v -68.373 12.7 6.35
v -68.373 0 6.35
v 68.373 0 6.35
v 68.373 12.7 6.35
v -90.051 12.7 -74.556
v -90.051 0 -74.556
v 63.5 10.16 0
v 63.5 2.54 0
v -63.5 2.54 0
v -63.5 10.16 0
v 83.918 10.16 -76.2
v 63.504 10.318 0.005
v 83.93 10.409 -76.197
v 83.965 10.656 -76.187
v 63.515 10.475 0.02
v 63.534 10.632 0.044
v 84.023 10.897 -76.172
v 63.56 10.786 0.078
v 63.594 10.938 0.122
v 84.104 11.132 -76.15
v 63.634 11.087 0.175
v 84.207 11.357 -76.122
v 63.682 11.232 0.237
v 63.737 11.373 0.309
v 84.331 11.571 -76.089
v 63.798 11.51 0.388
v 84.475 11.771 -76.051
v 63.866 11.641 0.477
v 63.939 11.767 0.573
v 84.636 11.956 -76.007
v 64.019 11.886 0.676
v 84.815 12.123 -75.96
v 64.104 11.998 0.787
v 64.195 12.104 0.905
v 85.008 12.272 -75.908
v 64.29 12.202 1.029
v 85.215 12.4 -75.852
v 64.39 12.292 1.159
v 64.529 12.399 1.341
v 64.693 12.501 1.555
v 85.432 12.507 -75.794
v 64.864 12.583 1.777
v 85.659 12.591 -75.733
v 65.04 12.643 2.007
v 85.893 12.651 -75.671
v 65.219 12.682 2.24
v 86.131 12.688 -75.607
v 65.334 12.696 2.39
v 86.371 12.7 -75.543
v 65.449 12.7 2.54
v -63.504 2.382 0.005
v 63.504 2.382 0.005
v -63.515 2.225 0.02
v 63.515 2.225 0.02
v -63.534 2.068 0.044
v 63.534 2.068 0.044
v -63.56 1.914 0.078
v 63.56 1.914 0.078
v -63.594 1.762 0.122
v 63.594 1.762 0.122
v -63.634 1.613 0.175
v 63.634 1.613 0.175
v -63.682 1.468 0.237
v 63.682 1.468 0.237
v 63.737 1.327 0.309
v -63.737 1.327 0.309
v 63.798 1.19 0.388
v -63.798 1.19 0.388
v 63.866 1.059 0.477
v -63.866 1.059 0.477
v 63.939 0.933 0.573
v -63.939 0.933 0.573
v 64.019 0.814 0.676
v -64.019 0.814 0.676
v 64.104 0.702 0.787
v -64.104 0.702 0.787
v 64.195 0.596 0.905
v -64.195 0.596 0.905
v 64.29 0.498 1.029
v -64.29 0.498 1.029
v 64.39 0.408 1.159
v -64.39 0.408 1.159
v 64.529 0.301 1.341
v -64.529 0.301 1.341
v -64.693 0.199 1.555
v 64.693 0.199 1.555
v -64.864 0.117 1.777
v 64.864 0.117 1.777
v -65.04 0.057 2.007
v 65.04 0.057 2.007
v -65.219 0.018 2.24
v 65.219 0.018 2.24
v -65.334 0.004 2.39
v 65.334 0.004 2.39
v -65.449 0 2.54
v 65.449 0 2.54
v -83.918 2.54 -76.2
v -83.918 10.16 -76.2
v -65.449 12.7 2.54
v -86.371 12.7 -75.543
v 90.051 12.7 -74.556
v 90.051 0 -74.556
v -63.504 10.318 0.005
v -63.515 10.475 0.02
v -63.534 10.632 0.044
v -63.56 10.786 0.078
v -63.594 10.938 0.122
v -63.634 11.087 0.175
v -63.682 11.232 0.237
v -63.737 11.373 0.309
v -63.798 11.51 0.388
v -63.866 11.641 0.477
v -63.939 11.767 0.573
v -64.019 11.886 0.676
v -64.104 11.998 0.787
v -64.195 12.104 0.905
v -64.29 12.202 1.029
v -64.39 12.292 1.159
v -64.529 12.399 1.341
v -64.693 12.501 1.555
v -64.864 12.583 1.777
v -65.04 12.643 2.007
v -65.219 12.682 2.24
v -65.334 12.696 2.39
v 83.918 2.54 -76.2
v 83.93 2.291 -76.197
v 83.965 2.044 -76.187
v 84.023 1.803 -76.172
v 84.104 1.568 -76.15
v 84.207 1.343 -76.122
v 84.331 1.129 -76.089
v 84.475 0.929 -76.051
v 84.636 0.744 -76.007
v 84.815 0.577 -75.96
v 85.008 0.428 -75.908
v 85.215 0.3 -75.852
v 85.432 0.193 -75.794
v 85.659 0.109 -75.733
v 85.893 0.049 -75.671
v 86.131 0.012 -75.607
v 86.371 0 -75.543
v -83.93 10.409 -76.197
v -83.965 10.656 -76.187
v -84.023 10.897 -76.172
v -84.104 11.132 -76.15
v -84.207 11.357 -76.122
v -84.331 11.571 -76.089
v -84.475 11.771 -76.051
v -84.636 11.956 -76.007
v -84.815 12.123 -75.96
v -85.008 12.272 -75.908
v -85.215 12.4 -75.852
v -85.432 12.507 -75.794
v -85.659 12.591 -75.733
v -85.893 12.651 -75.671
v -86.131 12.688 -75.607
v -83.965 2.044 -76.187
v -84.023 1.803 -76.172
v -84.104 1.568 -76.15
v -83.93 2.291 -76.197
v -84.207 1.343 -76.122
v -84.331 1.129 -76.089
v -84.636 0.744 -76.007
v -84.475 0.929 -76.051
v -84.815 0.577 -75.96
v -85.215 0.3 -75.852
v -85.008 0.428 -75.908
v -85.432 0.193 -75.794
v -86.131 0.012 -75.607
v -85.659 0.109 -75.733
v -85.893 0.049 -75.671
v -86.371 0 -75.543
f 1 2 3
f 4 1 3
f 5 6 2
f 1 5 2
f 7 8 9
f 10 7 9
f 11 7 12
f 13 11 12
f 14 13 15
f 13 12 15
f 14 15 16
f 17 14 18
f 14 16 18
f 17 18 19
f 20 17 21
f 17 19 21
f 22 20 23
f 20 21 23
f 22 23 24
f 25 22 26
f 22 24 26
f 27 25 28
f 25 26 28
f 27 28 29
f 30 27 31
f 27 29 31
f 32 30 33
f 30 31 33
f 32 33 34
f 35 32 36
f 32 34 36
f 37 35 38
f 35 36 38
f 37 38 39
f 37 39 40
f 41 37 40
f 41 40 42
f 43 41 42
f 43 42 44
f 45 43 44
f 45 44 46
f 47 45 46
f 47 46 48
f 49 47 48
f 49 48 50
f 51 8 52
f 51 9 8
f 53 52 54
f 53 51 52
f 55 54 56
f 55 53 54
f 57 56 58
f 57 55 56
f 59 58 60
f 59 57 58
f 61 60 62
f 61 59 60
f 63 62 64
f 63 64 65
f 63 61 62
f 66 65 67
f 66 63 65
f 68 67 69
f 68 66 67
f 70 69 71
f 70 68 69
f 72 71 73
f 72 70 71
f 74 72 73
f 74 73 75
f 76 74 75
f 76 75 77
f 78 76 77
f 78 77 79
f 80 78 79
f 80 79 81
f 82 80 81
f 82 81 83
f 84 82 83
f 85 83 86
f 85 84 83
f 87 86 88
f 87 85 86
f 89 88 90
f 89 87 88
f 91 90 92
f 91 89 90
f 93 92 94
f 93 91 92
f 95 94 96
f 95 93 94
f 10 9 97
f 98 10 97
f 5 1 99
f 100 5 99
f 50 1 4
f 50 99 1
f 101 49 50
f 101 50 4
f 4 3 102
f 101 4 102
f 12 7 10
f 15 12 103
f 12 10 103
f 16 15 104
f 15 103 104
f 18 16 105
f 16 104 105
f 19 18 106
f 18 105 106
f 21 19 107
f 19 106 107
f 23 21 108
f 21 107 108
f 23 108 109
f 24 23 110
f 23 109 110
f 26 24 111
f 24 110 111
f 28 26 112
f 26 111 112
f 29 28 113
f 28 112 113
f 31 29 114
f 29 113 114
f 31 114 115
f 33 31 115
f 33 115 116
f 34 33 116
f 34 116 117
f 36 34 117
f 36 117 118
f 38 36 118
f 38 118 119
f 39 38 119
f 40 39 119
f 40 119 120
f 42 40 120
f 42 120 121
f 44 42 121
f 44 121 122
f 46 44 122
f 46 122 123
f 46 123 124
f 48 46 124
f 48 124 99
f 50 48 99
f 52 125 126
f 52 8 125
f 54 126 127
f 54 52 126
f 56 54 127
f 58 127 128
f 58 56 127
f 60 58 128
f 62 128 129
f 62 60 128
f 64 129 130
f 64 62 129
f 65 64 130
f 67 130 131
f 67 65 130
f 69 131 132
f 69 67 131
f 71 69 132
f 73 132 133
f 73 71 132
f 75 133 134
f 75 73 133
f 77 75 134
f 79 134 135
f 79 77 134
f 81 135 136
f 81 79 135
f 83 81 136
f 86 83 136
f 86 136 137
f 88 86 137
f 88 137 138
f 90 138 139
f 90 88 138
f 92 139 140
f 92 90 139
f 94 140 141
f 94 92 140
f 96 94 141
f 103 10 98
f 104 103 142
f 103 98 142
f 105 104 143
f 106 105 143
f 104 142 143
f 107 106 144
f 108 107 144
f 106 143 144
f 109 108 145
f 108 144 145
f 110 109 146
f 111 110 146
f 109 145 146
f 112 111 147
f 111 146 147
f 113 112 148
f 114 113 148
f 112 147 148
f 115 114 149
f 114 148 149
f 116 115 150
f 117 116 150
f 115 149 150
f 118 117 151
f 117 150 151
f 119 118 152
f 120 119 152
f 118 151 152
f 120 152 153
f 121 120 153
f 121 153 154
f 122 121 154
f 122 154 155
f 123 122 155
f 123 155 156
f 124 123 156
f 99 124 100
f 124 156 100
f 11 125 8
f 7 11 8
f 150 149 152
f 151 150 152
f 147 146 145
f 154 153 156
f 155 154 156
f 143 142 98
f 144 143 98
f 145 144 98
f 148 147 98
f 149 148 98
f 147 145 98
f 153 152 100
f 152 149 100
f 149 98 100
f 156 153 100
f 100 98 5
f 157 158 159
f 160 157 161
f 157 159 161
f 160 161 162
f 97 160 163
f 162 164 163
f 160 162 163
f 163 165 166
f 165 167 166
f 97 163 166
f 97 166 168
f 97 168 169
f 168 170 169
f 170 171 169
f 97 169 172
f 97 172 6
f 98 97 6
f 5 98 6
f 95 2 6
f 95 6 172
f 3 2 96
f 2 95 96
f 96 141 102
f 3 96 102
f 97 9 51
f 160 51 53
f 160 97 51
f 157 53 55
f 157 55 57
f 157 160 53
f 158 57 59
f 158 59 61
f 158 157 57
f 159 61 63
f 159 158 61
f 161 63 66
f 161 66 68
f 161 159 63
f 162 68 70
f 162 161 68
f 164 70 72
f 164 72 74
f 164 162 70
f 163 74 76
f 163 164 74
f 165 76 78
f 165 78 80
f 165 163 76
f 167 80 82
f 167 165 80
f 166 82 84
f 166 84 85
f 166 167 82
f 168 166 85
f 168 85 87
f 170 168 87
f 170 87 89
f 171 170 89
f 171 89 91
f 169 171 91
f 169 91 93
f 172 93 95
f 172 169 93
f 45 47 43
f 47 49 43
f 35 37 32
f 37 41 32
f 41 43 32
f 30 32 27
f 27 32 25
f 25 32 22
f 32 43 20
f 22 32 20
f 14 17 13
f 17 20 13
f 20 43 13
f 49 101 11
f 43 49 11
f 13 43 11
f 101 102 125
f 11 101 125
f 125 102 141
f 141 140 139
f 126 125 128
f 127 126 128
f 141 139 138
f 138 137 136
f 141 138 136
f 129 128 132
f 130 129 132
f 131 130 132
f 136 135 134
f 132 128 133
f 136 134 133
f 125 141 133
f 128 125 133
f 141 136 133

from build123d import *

# Parameters (mm, degrees)
EXTRUDE1_DEPTH = 12.7
FILLET1_R      = 2.54


with BuildPart() as part:
    # Sketch1 → Extrude1 (new body)
    with BuildSketch(Plane(origin=(0, 0, 0), x_dir=(1, 0, 0), z_dir=(0, 1, 0))):
        Polygon((-63.5, 0), (-83.917728463, 76.2), (-90.05135746, 74.556499064), (-68.372526374, -6.35), (0, -6.35), (0, 0), align=None)
        Polygon((63.5, 0), (0, 0), (0, -6.35), (68.372526374, -6.35), (90.05135746, 74.556499064), (83.917728463, 76.2), align=None)
    extrude(amount=EXTRUDE1_DEPTH)

    # Fillet1
    fillet1_edges = [part.edges().sort_by_distance(p)[0] for p in [
        (73.708864232, 12.7, -38.1),
        (0, 12.7, 0),
        (-73.708864232, 12.7, -38.1),
        (-73.708864232, 0, -38.1),
        (0, 0, 0),
        (73.708864232, 0, -38.1),
    ]]
    fillet(fillet1_edges, radius=FILLET1_R)


solid = part.part
